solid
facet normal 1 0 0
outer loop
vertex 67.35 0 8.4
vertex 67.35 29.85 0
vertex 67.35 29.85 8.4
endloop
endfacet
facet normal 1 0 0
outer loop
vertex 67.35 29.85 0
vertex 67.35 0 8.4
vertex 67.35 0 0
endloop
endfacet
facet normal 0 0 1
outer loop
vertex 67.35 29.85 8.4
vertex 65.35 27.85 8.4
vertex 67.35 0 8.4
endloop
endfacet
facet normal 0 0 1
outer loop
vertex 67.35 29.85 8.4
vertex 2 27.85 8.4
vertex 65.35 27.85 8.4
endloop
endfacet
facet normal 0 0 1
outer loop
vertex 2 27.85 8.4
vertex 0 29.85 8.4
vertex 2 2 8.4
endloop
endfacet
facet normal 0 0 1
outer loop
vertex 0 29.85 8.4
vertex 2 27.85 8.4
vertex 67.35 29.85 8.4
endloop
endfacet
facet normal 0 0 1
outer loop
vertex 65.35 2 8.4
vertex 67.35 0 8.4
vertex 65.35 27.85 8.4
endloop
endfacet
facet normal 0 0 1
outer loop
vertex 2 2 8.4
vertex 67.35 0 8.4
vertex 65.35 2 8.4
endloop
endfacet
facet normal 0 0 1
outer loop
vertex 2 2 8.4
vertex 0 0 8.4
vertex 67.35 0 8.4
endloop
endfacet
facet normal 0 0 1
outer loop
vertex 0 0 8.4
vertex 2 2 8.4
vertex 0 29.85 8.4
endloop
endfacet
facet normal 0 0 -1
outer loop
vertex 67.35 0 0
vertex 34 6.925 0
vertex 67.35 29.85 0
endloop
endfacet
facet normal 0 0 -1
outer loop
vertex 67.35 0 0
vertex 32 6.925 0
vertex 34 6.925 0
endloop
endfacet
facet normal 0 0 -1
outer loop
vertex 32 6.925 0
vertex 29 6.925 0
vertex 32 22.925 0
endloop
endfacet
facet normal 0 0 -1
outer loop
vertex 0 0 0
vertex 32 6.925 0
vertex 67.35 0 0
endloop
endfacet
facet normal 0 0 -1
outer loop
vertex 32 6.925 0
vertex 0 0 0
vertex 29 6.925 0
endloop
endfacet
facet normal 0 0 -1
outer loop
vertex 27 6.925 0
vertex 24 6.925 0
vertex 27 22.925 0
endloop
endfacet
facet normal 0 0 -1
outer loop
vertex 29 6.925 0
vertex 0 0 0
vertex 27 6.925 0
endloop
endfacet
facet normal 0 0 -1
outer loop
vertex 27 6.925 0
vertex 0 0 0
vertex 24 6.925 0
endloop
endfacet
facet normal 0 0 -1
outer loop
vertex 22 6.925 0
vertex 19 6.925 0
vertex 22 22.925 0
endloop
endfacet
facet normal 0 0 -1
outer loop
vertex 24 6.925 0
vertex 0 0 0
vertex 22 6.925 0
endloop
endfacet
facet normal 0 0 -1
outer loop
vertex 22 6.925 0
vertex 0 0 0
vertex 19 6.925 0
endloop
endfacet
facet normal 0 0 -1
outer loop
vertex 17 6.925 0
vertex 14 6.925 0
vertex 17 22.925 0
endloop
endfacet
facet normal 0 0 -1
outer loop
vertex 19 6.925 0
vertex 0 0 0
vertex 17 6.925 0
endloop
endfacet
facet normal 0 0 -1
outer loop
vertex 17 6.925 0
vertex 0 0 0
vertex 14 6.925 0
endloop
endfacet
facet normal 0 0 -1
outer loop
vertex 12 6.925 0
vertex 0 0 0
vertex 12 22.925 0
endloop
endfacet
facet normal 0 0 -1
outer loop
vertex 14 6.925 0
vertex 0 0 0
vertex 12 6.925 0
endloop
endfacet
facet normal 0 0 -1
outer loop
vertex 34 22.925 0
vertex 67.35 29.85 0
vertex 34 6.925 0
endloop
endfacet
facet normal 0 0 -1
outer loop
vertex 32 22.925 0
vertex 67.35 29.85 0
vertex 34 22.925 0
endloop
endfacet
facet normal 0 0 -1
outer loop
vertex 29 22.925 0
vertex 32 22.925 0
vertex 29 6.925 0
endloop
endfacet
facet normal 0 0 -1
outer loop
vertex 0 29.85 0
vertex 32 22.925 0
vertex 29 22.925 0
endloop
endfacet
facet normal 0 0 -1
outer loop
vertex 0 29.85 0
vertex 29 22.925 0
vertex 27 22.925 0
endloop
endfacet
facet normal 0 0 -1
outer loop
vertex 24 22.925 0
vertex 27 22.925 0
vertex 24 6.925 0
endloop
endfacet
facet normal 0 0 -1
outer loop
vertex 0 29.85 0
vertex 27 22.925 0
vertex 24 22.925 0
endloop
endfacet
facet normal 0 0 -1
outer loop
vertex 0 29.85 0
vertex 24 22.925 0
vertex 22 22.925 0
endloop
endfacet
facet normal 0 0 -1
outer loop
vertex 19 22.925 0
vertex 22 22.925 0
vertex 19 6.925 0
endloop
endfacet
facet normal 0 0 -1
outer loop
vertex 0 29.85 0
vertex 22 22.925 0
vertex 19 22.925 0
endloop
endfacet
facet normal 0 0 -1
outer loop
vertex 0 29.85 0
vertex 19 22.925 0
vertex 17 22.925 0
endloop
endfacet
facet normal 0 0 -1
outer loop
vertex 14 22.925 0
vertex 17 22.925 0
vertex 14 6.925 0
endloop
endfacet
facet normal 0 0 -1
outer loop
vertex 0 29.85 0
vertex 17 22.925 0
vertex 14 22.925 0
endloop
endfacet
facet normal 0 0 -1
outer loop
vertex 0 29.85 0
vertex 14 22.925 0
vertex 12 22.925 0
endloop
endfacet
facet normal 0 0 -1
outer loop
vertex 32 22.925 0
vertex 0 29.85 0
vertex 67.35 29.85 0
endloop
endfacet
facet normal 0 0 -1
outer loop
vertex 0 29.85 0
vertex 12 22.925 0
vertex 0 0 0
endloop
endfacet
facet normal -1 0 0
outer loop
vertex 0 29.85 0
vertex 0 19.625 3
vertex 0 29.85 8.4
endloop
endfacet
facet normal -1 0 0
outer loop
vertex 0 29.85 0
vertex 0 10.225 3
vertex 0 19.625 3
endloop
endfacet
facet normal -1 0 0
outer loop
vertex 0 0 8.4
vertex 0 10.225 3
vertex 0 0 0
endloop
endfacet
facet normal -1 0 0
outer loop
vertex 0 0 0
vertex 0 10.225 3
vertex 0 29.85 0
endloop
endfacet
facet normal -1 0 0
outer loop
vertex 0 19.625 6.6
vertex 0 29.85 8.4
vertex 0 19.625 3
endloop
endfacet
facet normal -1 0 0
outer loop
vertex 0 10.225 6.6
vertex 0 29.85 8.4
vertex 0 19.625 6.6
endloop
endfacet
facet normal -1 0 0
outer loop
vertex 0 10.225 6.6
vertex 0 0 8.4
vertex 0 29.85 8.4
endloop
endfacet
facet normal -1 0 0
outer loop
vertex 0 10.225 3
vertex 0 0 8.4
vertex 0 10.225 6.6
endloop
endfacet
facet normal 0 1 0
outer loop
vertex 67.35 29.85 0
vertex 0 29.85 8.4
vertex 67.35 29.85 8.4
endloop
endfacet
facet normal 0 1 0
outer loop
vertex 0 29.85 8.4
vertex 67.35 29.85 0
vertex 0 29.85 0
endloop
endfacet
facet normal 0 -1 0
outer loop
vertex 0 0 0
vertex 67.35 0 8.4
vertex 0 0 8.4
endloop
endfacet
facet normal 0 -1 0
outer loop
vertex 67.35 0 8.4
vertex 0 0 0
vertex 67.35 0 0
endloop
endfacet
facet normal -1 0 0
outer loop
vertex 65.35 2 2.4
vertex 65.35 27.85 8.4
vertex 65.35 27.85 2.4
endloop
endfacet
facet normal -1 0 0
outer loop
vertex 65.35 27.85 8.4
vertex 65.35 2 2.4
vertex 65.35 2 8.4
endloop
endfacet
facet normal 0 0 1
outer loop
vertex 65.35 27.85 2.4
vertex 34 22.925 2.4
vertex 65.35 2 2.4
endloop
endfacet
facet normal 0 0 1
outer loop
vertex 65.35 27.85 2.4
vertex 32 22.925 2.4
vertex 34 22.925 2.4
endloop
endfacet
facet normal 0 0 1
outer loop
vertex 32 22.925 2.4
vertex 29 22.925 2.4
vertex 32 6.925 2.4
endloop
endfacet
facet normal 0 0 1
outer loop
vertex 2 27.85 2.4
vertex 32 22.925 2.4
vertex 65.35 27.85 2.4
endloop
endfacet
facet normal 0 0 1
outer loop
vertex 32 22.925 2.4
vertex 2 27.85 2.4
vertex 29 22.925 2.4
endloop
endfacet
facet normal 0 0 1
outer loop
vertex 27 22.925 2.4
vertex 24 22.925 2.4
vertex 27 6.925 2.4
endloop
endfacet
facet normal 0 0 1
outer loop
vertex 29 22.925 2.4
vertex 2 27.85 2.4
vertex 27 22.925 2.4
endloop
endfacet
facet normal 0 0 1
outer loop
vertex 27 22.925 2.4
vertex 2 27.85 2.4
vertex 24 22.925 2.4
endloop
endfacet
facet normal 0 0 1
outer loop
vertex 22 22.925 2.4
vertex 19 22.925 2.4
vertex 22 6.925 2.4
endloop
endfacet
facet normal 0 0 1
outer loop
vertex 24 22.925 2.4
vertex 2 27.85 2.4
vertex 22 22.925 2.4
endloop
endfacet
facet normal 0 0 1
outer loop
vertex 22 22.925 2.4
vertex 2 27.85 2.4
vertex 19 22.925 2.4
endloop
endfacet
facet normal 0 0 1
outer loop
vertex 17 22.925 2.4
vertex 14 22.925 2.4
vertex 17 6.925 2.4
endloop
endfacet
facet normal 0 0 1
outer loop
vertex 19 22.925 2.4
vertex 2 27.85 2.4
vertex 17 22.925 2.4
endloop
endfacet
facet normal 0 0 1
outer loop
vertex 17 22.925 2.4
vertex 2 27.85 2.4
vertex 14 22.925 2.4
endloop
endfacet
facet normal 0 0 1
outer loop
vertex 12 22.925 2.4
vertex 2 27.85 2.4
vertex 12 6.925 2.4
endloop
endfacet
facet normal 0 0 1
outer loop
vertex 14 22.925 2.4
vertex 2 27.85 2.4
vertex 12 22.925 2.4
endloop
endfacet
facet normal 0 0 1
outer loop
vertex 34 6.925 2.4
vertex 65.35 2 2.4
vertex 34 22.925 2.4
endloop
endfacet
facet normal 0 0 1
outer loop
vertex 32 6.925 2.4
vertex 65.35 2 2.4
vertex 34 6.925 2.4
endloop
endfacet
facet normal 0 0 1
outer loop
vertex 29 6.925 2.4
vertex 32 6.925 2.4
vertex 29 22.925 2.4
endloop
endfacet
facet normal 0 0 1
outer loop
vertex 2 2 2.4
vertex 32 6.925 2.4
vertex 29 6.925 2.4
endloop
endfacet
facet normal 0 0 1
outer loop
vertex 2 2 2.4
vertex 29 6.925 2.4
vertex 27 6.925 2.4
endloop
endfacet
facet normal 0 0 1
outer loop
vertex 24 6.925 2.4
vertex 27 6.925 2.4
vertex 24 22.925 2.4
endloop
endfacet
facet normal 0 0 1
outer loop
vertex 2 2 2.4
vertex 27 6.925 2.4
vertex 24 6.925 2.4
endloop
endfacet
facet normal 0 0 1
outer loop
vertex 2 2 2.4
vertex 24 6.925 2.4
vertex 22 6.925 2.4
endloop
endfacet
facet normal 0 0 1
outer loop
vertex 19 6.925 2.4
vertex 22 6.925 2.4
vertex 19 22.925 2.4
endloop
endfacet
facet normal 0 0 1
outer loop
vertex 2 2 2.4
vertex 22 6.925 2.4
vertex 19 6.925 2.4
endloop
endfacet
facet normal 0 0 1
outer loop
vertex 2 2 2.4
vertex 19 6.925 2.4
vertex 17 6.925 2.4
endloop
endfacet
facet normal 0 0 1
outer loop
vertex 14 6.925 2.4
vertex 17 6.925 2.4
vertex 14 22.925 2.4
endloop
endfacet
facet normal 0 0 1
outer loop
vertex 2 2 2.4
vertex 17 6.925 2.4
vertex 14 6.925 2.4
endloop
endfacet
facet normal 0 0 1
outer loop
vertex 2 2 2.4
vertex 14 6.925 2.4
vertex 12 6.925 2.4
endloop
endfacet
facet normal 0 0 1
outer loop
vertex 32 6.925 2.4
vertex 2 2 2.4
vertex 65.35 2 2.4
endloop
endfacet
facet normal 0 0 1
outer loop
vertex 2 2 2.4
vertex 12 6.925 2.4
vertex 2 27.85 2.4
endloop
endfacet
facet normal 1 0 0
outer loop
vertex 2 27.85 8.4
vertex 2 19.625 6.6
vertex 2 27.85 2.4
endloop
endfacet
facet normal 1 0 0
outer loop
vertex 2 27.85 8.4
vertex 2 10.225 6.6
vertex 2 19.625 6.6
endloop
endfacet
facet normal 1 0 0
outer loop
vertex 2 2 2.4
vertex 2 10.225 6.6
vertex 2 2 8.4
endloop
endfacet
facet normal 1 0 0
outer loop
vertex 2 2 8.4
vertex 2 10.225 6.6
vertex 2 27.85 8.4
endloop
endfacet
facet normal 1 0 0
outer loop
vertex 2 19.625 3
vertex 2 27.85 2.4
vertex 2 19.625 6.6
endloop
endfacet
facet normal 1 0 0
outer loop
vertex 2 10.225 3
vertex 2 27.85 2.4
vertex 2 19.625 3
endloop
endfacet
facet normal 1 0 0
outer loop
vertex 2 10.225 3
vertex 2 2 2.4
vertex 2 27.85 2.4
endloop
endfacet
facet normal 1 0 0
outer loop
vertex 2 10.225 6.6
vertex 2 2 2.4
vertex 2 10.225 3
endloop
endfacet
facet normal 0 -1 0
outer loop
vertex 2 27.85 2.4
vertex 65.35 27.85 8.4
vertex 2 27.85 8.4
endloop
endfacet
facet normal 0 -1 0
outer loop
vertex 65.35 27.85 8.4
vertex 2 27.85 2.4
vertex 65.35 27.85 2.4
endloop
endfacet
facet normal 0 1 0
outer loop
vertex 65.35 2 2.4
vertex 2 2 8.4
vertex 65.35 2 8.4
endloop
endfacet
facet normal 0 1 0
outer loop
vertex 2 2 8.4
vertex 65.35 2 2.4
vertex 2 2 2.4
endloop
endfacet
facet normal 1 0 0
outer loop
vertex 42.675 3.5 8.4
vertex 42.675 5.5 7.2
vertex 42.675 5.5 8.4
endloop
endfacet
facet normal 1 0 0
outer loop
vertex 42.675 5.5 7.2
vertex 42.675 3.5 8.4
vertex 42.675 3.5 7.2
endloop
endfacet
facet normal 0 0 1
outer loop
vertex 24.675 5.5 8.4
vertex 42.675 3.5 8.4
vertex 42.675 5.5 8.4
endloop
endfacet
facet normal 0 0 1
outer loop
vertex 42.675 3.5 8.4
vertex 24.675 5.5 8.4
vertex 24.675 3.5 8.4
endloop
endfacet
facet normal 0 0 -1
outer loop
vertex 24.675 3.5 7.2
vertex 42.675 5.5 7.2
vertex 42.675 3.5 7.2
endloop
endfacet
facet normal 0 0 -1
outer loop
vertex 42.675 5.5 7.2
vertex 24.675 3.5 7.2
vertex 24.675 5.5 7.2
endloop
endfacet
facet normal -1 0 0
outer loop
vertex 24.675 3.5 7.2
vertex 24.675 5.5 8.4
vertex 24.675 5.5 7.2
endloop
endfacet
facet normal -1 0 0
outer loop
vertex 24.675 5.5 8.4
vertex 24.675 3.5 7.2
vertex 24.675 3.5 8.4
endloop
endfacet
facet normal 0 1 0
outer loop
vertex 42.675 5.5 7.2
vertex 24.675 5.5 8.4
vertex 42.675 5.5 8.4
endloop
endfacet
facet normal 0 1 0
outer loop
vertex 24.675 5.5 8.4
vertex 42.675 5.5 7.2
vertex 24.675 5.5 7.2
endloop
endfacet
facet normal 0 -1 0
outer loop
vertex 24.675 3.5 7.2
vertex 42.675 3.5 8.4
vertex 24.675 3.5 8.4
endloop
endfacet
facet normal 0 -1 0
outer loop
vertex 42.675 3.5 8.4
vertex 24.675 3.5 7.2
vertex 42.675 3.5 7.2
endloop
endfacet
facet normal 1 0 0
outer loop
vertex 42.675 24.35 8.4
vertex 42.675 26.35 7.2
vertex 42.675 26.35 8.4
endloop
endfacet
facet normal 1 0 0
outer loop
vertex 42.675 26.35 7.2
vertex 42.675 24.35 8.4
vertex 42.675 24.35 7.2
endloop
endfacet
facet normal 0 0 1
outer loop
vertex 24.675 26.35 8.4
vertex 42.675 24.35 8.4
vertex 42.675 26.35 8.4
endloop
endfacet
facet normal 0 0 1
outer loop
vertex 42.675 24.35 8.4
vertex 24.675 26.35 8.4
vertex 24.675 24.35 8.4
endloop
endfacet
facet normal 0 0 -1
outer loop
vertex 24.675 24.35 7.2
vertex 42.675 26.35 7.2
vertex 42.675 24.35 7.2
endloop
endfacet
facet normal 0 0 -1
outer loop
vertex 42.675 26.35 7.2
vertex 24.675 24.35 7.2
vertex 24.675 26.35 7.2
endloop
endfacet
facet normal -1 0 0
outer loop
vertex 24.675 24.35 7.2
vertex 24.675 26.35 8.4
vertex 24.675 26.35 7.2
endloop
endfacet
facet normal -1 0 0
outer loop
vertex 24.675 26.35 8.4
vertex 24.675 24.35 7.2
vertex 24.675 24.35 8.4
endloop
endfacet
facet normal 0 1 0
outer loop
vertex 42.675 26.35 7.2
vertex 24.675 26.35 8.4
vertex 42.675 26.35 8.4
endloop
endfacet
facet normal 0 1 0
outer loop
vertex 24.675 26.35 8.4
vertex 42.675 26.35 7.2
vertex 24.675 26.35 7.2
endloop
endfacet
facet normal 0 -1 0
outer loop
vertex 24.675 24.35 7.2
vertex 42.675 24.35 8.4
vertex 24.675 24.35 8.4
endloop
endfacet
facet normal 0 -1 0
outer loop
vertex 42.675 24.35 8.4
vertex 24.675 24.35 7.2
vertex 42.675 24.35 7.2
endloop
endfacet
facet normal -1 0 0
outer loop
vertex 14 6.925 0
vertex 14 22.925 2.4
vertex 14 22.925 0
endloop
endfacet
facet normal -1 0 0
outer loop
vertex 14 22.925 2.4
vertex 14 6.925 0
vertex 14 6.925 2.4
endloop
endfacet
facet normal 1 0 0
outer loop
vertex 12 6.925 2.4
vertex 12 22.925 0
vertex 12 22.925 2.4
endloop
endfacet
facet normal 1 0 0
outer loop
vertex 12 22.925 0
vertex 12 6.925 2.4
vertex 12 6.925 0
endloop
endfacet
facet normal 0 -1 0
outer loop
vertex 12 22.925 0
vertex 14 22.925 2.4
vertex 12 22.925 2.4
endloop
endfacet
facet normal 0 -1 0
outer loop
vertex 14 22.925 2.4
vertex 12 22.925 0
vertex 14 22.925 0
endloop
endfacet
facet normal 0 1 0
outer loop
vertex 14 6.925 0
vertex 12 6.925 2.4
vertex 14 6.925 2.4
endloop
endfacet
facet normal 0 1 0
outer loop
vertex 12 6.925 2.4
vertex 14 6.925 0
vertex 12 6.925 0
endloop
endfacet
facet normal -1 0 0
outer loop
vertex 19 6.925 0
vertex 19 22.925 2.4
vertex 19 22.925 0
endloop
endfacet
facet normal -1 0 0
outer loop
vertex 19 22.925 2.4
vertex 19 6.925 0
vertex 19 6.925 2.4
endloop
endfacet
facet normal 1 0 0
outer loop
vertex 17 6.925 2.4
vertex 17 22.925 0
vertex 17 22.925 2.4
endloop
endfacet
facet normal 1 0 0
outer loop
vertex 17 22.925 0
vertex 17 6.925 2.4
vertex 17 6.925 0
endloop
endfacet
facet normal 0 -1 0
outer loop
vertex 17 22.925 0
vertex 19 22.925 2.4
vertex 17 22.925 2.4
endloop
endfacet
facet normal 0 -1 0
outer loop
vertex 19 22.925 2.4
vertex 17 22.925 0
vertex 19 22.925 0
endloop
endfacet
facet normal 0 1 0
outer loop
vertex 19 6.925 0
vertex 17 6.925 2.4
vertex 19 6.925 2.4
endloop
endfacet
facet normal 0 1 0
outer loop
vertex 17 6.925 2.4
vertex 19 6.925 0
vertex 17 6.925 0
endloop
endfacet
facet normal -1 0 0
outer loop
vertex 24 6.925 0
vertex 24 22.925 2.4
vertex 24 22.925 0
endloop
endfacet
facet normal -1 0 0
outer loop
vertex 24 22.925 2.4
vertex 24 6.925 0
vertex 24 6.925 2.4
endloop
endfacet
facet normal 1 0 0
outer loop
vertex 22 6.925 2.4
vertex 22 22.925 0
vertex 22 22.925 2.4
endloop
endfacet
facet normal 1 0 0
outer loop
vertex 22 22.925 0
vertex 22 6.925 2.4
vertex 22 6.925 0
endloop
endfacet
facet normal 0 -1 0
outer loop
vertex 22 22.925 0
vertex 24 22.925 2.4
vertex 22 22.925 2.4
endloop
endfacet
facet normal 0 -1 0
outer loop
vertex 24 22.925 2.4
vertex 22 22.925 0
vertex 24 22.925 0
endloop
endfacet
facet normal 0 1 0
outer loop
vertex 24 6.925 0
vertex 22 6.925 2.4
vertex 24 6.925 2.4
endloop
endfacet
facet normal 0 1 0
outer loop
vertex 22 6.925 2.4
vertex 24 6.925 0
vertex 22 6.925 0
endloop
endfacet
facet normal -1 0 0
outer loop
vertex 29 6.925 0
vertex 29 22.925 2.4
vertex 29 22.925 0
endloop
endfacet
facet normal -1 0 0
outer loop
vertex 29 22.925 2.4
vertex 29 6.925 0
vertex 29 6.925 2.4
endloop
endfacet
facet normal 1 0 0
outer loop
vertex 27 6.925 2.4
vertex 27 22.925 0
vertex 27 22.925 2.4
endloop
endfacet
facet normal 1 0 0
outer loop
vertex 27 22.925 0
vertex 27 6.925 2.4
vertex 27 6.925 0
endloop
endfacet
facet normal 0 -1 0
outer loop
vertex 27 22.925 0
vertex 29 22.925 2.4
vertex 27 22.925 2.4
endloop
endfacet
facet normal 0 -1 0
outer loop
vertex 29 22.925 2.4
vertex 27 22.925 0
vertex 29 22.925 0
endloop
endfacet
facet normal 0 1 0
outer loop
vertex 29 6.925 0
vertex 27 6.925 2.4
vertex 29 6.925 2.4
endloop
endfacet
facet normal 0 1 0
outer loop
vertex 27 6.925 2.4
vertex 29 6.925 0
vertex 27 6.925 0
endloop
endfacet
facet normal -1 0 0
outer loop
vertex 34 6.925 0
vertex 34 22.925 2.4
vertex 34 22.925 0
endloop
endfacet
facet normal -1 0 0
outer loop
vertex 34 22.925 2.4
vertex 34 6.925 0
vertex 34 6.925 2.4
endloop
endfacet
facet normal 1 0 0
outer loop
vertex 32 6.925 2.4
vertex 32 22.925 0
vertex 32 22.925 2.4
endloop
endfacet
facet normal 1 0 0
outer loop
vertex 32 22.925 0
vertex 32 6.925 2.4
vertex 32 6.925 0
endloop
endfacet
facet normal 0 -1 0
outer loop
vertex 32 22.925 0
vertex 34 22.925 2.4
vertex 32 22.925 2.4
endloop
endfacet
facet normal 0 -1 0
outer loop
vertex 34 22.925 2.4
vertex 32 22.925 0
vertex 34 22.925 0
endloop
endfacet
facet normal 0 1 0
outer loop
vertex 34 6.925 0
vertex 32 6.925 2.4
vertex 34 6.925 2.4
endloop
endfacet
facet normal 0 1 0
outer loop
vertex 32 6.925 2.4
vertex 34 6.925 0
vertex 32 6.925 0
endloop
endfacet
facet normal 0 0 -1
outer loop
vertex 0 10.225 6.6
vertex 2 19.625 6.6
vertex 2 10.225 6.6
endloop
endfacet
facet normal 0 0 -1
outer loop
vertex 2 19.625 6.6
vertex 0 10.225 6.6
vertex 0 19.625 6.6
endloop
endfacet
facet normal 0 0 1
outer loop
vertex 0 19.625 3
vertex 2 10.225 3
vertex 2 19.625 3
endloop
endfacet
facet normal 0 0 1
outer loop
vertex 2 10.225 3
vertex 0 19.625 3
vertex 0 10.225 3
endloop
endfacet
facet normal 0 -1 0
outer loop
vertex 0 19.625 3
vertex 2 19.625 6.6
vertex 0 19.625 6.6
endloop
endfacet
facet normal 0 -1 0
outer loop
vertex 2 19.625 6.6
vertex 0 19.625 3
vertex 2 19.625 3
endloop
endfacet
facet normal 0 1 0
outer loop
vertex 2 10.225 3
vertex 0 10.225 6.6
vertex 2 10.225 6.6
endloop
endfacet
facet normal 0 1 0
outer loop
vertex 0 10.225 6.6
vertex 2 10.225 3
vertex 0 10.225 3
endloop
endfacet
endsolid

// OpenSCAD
// ESP32-S3 DevKitC-1 snap-fit mount — parametric, millimetres.
// Print: 0.4 mm nozzle, 0.2 mm layers, 3 perimeters, no supports required.
// Good first issue: add a USB-C cutout variant + antenna keep-out.

$fn = 48;

board_length = 63.0;
board_width  = 25.5;
board_thick  = 1.6;

wall         = 2.0;
floor        = 2.4;
wall_height  = 6.0;
clearance    = 0.35;

usb_width    = 9.4;
usb_height   = 3.6;

outer_length = board_length + 2 * wall + clearance;
outer_width  = board_width  + 2 * wall + clearance;

module floor_plate() {
    cube([outer_length, outer_width, floor]);
}

module perimeter_wall() {
    difference() {
        cube([outer_length, outer_width, floor + wall_height]);
        translate([wall, wall, floor])
            cube([outer_length - 2 * wall, outer_width - 2 * wall, wall_height + 1]);
    }
}

module snap_lips() {
    // two cantilever lips that retain the PCB on the long edges
    for (y = [wall + 1.5, outer_width - wall - 3.5]) {
        translate([outer_length / 2 - 9, y, floor + wall_height - 1.2])
            cube([18, 2.0, 1.2]);
    }
}

module usb_cutout() {
    translate([-0.1, (outer_width - usb_width) / 2, floor + 0.6])
        cube([wall + 0.2, usb_width, usb_height]);
}

module vent_slots(count = 5, slot = 2.0) {
    for (i = [0 : count - 1])
        translate([12 + i * (slot + 3), outer_width / 2 - 8, -0.1])
            cube([slot, 16, floor + 0.2]);
}

module esp32_mount() {
    difference() {
        union() {
            floor_plate();
            perimeter_wall();
            snap_lips();
        }
        usb_cutout();
        vent_slots();
    }
}

esp32_mount();
